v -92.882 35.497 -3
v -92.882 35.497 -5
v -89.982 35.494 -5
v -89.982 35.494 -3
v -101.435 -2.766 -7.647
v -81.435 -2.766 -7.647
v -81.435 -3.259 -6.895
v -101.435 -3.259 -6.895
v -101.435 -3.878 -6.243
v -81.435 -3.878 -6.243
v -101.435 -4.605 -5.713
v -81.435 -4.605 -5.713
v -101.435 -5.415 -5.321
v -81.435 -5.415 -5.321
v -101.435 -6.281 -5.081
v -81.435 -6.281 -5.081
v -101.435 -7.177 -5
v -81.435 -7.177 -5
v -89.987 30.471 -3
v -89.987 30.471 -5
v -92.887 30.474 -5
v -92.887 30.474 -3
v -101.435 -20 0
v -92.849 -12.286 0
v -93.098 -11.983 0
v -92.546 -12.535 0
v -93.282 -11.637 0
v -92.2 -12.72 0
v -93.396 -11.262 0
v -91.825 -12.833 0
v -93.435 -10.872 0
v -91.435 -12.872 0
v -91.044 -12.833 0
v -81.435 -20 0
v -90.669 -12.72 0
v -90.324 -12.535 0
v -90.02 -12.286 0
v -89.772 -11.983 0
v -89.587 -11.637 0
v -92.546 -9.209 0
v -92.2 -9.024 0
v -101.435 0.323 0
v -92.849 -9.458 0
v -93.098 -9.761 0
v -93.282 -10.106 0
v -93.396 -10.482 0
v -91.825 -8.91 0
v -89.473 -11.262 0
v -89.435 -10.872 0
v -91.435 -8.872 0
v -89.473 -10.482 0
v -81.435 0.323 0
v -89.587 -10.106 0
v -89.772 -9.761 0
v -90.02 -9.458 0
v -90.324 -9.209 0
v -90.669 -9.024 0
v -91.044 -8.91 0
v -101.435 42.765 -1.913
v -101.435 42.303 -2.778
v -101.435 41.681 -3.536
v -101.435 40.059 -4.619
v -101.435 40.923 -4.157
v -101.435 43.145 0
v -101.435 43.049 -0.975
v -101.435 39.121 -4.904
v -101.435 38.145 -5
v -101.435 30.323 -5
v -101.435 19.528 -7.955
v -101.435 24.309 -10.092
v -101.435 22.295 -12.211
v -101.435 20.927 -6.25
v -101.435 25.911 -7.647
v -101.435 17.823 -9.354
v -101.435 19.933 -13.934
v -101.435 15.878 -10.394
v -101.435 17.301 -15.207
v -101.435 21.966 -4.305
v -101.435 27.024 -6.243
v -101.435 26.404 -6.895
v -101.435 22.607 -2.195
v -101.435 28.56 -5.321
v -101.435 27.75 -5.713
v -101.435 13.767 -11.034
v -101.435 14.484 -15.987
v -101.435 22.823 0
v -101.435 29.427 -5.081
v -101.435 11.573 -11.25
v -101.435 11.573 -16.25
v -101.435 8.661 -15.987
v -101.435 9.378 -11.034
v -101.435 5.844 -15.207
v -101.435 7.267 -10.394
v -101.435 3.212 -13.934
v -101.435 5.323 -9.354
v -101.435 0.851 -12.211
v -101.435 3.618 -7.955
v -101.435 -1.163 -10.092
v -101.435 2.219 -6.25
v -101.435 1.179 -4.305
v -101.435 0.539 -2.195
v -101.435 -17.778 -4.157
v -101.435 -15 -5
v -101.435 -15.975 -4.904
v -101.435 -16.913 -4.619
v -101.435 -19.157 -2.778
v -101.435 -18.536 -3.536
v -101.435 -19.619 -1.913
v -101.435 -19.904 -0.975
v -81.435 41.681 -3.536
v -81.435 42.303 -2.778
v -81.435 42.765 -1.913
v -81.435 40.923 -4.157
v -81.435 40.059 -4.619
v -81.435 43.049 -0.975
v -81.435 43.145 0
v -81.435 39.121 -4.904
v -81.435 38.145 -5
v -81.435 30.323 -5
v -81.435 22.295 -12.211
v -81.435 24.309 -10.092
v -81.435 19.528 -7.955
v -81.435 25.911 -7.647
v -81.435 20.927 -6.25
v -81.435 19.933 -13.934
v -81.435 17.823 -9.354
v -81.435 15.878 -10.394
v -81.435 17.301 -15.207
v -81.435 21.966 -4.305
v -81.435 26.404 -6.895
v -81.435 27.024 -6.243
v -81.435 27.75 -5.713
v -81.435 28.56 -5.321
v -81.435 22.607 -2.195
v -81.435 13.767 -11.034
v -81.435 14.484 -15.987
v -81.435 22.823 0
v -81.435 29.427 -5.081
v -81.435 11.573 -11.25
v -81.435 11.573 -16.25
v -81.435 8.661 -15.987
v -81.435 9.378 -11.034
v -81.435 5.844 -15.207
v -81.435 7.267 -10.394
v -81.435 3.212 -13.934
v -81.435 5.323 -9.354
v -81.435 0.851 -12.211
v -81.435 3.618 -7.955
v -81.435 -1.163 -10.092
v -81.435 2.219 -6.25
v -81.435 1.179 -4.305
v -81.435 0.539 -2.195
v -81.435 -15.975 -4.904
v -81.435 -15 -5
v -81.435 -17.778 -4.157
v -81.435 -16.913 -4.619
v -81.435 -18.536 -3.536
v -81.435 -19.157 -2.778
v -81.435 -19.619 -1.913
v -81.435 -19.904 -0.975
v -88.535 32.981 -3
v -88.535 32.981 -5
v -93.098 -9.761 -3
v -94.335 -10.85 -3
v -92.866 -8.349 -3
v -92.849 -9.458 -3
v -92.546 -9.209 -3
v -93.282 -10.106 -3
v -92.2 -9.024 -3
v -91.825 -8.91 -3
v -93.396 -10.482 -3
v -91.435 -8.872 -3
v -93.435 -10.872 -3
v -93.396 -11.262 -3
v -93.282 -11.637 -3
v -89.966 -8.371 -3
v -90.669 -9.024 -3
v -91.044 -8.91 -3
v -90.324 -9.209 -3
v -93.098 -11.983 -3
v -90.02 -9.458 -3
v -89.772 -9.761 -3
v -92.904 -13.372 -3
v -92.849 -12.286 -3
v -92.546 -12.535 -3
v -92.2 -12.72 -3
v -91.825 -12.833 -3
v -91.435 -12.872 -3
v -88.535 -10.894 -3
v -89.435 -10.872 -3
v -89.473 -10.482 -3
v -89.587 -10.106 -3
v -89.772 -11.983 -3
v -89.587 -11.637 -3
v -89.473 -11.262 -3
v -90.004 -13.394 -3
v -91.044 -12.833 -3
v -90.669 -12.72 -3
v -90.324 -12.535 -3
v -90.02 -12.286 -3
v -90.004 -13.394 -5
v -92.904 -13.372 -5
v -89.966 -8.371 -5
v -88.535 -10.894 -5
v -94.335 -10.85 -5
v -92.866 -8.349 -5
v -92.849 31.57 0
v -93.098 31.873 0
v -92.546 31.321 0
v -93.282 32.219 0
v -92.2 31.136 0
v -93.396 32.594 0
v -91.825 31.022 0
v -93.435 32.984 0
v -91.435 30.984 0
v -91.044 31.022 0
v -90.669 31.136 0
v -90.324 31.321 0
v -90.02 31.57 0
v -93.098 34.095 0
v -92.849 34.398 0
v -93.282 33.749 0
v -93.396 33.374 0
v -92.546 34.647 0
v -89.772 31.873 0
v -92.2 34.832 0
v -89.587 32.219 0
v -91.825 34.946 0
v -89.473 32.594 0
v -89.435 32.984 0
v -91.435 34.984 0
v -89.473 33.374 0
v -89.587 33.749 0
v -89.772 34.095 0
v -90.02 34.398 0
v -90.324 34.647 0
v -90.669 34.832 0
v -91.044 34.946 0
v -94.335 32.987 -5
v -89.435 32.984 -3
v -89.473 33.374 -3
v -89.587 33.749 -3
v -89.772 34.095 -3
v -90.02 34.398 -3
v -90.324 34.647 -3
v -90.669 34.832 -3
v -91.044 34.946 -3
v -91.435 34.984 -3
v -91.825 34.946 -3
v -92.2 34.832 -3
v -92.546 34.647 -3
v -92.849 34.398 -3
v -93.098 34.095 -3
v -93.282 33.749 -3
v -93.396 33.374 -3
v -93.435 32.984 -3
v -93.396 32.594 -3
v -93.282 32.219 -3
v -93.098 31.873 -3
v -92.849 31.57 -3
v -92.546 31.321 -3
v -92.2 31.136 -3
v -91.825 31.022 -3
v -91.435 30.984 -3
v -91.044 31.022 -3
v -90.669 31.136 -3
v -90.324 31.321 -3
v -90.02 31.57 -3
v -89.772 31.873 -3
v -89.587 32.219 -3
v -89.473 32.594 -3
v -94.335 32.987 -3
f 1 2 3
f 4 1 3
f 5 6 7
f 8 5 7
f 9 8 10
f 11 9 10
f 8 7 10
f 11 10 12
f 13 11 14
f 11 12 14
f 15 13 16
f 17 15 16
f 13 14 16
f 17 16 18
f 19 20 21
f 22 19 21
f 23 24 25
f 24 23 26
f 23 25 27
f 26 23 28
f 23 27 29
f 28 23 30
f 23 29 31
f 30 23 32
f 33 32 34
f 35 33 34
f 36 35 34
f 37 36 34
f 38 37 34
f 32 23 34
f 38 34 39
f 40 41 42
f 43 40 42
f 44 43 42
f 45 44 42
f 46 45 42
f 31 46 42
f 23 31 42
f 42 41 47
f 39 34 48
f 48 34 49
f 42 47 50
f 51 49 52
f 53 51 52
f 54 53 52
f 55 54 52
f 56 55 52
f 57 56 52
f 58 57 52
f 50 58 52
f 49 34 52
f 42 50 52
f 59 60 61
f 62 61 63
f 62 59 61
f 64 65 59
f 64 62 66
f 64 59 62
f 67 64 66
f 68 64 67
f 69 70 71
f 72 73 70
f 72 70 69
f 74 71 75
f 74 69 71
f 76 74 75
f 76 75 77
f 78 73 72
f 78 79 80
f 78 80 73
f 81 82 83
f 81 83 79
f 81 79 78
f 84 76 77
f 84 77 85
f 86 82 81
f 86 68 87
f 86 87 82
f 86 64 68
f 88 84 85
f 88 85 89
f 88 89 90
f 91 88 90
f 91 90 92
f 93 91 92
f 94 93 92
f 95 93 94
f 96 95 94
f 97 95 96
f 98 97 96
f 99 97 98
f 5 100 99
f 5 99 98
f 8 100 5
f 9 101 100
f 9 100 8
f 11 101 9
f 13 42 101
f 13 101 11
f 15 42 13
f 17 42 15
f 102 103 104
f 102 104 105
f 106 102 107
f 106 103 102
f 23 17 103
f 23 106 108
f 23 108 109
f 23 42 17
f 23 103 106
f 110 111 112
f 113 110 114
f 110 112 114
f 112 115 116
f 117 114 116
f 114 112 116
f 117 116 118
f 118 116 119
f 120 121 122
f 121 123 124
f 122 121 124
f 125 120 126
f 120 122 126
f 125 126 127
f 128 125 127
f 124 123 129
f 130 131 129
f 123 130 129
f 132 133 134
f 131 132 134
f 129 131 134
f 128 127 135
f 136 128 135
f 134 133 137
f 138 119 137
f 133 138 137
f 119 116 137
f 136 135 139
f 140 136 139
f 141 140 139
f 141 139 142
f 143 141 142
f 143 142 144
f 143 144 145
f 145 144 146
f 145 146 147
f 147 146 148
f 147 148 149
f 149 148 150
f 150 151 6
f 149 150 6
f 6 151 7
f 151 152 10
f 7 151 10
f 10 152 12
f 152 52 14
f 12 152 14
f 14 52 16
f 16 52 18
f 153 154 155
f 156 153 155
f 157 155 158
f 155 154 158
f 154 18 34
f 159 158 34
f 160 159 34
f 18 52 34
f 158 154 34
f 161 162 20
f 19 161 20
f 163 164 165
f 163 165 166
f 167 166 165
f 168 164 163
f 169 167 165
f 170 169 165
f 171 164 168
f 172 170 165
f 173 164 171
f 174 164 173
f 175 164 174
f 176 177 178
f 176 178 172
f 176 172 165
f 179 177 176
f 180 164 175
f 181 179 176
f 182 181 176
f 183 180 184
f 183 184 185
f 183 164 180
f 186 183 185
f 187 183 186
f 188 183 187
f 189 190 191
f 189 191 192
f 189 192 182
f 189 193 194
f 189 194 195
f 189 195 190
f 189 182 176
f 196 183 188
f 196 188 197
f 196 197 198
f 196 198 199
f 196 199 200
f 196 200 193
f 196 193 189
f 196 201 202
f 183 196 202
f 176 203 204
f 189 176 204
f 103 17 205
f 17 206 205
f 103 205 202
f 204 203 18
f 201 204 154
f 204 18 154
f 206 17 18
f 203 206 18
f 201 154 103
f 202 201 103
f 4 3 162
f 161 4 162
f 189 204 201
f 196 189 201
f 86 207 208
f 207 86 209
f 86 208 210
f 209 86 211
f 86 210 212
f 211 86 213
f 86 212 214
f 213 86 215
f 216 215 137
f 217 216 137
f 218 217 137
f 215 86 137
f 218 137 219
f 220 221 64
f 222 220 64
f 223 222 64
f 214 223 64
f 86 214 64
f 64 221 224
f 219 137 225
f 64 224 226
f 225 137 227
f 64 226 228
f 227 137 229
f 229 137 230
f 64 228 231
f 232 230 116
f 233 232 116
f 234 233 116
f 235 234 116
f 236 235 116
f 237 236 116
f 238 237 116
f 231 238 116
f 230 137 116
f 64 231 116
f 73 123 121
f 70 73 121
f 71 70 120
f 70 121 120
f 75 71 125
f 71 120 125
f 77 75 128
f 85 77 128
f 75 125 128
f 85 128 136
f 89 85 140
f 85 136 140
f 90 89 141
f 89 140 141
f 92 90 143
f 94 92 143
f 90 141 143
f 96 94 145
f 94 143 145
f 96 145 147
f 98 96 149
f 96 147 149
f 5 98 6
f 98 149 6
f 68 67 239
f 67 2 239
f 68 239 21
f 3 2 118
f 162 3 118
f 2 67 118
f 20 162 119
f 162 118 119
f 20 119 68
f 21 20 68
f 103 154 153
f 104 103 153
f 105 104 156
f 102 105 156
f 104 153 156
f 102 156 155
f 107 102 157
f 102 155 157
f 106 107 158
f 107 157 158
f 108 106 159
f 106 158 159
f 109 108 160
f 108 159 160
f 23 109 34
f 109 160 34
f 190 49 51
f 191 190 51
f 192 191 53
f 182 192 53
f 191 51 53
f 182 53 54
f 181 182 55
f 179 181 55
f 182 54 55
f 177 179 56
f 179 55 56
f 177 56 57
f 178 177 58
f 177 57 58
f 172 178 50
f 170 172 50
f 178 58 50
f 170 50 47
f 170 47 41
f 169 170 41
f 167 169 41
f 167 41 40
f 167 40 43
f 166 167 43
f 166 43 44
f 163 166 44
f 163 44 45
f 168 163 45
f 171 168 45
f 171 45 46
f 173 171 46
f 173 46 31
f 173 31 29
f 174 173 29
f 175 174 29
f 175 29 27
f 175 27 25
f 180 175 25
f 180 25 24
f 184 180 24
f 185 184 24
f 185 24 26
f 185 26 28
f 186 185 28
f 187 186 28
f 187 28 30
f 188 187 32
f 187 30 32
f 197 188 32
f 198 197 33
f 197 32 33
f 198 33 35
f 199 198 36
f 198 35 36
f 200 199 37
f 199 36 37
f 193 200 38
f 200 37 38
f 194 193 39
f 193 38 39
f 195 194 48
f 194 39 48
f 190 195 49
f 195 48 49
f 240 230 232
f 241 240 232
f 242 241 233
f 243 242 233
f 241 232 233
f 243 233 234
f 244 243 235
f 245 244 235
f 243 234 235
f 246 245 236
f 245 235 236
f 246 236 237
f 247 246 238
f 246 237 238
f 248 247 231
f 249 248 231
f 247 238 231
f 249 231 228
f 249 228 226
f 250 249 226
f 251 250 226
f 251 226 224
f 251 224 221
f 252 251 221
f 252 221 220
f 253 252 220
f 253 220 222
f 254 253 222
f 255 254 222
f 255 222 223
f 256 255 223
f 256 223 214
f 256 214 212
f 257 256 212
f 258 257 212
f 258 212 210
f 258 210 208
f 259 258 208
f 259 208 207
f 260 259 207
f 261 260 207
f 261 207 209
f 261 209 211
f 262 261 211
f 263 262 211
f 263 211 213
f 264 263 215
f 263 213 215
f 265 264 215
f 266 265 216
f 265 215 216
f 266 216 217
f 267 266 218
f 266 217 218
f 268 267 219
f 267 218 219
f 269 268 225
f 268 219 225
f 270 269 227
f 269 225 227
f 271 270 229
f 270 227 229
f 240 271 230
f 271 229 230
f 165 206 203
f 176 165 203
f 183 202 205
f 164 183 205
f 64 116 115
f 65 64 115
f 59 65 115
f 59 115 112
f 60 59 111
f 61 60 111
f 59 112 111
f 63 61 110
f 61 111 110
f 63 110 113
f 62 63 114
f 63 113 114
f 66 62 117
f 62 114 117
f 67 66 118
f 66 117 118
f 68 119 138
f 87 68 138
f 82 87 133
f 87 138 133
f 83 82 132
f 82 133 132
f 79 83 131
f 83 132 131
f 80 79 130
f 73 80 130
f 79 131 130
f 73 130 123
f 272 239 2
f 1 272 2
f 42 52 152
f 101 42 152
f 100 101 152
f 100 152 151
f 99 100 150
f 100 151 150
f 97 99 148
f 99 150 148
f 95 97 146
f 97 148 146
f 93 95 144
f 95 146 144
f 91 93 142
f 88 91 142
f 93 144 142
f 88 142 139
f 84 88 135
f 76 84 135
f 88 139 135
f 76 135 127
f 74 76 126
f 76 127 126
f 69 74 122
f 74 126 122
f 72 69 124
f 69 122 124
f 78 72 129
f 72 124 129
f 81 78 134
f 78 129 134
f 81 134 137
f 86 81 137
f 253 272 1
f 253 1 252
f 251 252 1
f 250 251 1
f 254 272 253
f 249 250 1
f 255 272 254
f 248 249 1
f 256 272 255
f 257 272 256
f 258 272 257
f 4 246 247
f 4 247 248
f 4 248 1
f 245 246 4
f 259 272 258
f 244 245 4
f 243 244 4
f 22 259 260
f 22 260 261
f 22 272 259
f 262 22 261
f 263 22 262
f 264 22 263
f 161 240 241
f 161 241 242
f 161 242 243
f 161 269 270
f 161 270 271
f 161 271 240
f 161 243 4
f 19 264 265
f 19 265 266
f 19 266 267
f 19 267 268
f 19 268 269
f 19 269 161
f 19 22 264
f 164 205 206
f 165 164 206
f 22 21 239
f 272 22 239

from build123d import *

# Parameters (mm, degrees)
F0_R      = 2
F1_DEPTH  = 25
F3_DEPTH  = 276
F4_R      = 2
F5_DEPTH  = 84.8
F6_R      = 2.5
F7_DEPTH  = 5
F9_DEPTH  = 20
F10_R     = 2
F11_DEPTH = 25
F14_DEPTH = 2


with BuildPart() as f1:
    # F0 (on Top) → F1 (new body)
    with BuildSketch(Plane.XY):
        with BuildLine():
            Line((-51.434658, 66.572686), (-81.434658, 66.572686))
            Line((-81.434658, 66.572686), (-81.434658, -43.427314))
            Line((-81.434658, -43.427314), (-6.434658, -43.427314))
            ThreePointArc((-6.434658, -43.427314), (8.565342, -58.427314), (23.565342, -43.427314))
            Line((23.565342, -43.427314), (98.565342, -43.427314))
            Line((98.565342, -43.427314), (98.565342, 66.572686))
            Line((98.565342, 66.572686), (68.565342, 66.572686))
            ThreePointArc((68.565342, 66.572686), (53.565342, 81.572686), (38.565342, 66.572686))
            Line((38.565342, 66.572686), (-21.434658, 66.572686))
            ThreePointArc((-21.434658, 66.572686), (-36.434658, 81.572686), (-51.434658, 66.572686))
        make_face()
        with Locations((8.565342, -50.927314)):
            Circle(F0_R, mode=Mode.SUBTRACT)
        with Locations((-36.434658, 74.072686)):
            Circle(F0_R, mode=Mode.SUBTRACT)
        with Locations((53.565342, 74.072686)):
            Circle(F0_R, mode=Mode.SUBTRACT)
    extrude(amount=F1_DEPTH)

    # F2 (on face) → F3 (cut)
    with BuildSketch(Plane.YZ.offset(98.565342)):
        with BuildLine():
            Line((43.145373, 0), (22.822686, 0))
            ThreePointArc((22.822686, 0), (11.572686, 11.25), (0.322686, 0))
            Line((0.322686, 0), (-20, 0))
            ThreePointArc((-20, 0), (-41.231841, 11.150842), (-64.902842, 15))
            Line((-64.902842, 15), (-64.902842, -16.413443))
            Line((-64.902842, -16.413443), (88.048215, -16.413443))
            Line((88.048215, -16.413443), (88.048215, 15))
            ThreePointArc((88.048215, 15), (64.377213, 11.150842), (43.145373, 0))
        make_face()
    extrude(amount=-F3_DEPTH, mode=Mode.SUBTRACT)

    # F4 (on face) → F5 (cut)
    with BuildSketch(Plane.XY.offset(25)):
        with Locations((-56.434658, 32.872686)):
            Circle(F4_R)
        with Locations((73.565342, 32.872686)):
            Circle(F4_R)
        with Locations((-56.434658, -9.727314)):
            Circle(F4_R)
        with Locations((73.565342, -9.727314)):
            Circle(F4_R)
    extrude(amount=-F5_DEPTH, mode=Mode.SUBTRACT)

    # F6 (on face) → F7 (cut)
    with BuildSketch(Plane.XY.offset(25)):
        with Locations((-56.434658, 32.872686)):
            Circle(F6_R)
        with Locations((73.565342, 32.872686)):
            Circle(F6_R)
        with Locations((73.565342, -9.727314)):
            Circle(F6_R)
        with Locations((-56.434658, -9.727314)):
            Circle(F6_R)
    extrude(amount=-F7_DEPTH, mode=Mode.SUBTRACT)


with BuildPart() as f9:
    # F8 (on face) → F9 (new body)
    with BuildSketch(Plane(origin=(-81.434658, 0, 0), x_dir=(0, -1, 0), z_dir=(-1, 0, 0))):
        with BuildLine():
            ThreePointArc((-0.322686, 0), (-11.572686, -11.25), (-22.822686, 0))
            Line((-22.822686, 0), (-43.145373, 0))
            ThreePointArc((-43.145373, 0), (-41.680906, -3.535534), (-38.145373, -5))
            Line((-38.145373, -5), (-30.322686, -5))
            ThreePointArc((-30.322686, -5), (-27.750207, -5.712535), (-25.910922, -7.647059))
            ThreePointArc((-25.910922, -7.647059), (-11.572686, -16.25), (2.765549, -7.647059))
            ThreePointArc((2.765549, -7.647059), (4.604835, -5.712535), (7.177314, -5))
            Line((7.177314, -5), (15, -5))
            ThreePointArc((15, -5), (18.535534, -3.535534), (20, 0))
            Line((20, 0), (-0.322686, 0))
        make_face()
    extrude(amount=F9_DEPTH)

    # F10 (on face) → F11 (cut)
    with BuildSketch(Plane.XY):
        with Locations((-91.434658, 32.984029)):
            Circle(F10_R)
        with Locations((-91.434658, -10.871857)):
            Circle(F10_R)
    extrude(amount=-F11_DEPTH, mode=Mode.SUBTRACT)

    # F13 (on face) + F12 (on face) → F14 (cut)
    with BuildSketch(Plane(origin=(0, 0, -5), x_dir=(1, 0, 0), z_dir=(0, 0, -1))):
        Polygon((-89.965689, 8.371431), (-88.534741, 10.893809), (-90.00371, 13.394235), (-92.903627, 13.372283), (-94.334575, 10.849906), (-92.865606, 8.34948), align=None)
    with BuildSketch(Plane(origin=(0, 0, -5), x_dir=(1, 0, 0), z_dir=(0, 0, -1))):
        Polygon((-89.982201, -35.494083), (-88.534659, -32.981191), (-89.987117, -30.471138), (-92.887115, -30.473976), (-94.334657, -32.986868), (-92.882199, -35.496921), align=None)
    extrude(amount=-F14_DEPTH, mode=Mode.SUBTRACT)


solid = f9.part
